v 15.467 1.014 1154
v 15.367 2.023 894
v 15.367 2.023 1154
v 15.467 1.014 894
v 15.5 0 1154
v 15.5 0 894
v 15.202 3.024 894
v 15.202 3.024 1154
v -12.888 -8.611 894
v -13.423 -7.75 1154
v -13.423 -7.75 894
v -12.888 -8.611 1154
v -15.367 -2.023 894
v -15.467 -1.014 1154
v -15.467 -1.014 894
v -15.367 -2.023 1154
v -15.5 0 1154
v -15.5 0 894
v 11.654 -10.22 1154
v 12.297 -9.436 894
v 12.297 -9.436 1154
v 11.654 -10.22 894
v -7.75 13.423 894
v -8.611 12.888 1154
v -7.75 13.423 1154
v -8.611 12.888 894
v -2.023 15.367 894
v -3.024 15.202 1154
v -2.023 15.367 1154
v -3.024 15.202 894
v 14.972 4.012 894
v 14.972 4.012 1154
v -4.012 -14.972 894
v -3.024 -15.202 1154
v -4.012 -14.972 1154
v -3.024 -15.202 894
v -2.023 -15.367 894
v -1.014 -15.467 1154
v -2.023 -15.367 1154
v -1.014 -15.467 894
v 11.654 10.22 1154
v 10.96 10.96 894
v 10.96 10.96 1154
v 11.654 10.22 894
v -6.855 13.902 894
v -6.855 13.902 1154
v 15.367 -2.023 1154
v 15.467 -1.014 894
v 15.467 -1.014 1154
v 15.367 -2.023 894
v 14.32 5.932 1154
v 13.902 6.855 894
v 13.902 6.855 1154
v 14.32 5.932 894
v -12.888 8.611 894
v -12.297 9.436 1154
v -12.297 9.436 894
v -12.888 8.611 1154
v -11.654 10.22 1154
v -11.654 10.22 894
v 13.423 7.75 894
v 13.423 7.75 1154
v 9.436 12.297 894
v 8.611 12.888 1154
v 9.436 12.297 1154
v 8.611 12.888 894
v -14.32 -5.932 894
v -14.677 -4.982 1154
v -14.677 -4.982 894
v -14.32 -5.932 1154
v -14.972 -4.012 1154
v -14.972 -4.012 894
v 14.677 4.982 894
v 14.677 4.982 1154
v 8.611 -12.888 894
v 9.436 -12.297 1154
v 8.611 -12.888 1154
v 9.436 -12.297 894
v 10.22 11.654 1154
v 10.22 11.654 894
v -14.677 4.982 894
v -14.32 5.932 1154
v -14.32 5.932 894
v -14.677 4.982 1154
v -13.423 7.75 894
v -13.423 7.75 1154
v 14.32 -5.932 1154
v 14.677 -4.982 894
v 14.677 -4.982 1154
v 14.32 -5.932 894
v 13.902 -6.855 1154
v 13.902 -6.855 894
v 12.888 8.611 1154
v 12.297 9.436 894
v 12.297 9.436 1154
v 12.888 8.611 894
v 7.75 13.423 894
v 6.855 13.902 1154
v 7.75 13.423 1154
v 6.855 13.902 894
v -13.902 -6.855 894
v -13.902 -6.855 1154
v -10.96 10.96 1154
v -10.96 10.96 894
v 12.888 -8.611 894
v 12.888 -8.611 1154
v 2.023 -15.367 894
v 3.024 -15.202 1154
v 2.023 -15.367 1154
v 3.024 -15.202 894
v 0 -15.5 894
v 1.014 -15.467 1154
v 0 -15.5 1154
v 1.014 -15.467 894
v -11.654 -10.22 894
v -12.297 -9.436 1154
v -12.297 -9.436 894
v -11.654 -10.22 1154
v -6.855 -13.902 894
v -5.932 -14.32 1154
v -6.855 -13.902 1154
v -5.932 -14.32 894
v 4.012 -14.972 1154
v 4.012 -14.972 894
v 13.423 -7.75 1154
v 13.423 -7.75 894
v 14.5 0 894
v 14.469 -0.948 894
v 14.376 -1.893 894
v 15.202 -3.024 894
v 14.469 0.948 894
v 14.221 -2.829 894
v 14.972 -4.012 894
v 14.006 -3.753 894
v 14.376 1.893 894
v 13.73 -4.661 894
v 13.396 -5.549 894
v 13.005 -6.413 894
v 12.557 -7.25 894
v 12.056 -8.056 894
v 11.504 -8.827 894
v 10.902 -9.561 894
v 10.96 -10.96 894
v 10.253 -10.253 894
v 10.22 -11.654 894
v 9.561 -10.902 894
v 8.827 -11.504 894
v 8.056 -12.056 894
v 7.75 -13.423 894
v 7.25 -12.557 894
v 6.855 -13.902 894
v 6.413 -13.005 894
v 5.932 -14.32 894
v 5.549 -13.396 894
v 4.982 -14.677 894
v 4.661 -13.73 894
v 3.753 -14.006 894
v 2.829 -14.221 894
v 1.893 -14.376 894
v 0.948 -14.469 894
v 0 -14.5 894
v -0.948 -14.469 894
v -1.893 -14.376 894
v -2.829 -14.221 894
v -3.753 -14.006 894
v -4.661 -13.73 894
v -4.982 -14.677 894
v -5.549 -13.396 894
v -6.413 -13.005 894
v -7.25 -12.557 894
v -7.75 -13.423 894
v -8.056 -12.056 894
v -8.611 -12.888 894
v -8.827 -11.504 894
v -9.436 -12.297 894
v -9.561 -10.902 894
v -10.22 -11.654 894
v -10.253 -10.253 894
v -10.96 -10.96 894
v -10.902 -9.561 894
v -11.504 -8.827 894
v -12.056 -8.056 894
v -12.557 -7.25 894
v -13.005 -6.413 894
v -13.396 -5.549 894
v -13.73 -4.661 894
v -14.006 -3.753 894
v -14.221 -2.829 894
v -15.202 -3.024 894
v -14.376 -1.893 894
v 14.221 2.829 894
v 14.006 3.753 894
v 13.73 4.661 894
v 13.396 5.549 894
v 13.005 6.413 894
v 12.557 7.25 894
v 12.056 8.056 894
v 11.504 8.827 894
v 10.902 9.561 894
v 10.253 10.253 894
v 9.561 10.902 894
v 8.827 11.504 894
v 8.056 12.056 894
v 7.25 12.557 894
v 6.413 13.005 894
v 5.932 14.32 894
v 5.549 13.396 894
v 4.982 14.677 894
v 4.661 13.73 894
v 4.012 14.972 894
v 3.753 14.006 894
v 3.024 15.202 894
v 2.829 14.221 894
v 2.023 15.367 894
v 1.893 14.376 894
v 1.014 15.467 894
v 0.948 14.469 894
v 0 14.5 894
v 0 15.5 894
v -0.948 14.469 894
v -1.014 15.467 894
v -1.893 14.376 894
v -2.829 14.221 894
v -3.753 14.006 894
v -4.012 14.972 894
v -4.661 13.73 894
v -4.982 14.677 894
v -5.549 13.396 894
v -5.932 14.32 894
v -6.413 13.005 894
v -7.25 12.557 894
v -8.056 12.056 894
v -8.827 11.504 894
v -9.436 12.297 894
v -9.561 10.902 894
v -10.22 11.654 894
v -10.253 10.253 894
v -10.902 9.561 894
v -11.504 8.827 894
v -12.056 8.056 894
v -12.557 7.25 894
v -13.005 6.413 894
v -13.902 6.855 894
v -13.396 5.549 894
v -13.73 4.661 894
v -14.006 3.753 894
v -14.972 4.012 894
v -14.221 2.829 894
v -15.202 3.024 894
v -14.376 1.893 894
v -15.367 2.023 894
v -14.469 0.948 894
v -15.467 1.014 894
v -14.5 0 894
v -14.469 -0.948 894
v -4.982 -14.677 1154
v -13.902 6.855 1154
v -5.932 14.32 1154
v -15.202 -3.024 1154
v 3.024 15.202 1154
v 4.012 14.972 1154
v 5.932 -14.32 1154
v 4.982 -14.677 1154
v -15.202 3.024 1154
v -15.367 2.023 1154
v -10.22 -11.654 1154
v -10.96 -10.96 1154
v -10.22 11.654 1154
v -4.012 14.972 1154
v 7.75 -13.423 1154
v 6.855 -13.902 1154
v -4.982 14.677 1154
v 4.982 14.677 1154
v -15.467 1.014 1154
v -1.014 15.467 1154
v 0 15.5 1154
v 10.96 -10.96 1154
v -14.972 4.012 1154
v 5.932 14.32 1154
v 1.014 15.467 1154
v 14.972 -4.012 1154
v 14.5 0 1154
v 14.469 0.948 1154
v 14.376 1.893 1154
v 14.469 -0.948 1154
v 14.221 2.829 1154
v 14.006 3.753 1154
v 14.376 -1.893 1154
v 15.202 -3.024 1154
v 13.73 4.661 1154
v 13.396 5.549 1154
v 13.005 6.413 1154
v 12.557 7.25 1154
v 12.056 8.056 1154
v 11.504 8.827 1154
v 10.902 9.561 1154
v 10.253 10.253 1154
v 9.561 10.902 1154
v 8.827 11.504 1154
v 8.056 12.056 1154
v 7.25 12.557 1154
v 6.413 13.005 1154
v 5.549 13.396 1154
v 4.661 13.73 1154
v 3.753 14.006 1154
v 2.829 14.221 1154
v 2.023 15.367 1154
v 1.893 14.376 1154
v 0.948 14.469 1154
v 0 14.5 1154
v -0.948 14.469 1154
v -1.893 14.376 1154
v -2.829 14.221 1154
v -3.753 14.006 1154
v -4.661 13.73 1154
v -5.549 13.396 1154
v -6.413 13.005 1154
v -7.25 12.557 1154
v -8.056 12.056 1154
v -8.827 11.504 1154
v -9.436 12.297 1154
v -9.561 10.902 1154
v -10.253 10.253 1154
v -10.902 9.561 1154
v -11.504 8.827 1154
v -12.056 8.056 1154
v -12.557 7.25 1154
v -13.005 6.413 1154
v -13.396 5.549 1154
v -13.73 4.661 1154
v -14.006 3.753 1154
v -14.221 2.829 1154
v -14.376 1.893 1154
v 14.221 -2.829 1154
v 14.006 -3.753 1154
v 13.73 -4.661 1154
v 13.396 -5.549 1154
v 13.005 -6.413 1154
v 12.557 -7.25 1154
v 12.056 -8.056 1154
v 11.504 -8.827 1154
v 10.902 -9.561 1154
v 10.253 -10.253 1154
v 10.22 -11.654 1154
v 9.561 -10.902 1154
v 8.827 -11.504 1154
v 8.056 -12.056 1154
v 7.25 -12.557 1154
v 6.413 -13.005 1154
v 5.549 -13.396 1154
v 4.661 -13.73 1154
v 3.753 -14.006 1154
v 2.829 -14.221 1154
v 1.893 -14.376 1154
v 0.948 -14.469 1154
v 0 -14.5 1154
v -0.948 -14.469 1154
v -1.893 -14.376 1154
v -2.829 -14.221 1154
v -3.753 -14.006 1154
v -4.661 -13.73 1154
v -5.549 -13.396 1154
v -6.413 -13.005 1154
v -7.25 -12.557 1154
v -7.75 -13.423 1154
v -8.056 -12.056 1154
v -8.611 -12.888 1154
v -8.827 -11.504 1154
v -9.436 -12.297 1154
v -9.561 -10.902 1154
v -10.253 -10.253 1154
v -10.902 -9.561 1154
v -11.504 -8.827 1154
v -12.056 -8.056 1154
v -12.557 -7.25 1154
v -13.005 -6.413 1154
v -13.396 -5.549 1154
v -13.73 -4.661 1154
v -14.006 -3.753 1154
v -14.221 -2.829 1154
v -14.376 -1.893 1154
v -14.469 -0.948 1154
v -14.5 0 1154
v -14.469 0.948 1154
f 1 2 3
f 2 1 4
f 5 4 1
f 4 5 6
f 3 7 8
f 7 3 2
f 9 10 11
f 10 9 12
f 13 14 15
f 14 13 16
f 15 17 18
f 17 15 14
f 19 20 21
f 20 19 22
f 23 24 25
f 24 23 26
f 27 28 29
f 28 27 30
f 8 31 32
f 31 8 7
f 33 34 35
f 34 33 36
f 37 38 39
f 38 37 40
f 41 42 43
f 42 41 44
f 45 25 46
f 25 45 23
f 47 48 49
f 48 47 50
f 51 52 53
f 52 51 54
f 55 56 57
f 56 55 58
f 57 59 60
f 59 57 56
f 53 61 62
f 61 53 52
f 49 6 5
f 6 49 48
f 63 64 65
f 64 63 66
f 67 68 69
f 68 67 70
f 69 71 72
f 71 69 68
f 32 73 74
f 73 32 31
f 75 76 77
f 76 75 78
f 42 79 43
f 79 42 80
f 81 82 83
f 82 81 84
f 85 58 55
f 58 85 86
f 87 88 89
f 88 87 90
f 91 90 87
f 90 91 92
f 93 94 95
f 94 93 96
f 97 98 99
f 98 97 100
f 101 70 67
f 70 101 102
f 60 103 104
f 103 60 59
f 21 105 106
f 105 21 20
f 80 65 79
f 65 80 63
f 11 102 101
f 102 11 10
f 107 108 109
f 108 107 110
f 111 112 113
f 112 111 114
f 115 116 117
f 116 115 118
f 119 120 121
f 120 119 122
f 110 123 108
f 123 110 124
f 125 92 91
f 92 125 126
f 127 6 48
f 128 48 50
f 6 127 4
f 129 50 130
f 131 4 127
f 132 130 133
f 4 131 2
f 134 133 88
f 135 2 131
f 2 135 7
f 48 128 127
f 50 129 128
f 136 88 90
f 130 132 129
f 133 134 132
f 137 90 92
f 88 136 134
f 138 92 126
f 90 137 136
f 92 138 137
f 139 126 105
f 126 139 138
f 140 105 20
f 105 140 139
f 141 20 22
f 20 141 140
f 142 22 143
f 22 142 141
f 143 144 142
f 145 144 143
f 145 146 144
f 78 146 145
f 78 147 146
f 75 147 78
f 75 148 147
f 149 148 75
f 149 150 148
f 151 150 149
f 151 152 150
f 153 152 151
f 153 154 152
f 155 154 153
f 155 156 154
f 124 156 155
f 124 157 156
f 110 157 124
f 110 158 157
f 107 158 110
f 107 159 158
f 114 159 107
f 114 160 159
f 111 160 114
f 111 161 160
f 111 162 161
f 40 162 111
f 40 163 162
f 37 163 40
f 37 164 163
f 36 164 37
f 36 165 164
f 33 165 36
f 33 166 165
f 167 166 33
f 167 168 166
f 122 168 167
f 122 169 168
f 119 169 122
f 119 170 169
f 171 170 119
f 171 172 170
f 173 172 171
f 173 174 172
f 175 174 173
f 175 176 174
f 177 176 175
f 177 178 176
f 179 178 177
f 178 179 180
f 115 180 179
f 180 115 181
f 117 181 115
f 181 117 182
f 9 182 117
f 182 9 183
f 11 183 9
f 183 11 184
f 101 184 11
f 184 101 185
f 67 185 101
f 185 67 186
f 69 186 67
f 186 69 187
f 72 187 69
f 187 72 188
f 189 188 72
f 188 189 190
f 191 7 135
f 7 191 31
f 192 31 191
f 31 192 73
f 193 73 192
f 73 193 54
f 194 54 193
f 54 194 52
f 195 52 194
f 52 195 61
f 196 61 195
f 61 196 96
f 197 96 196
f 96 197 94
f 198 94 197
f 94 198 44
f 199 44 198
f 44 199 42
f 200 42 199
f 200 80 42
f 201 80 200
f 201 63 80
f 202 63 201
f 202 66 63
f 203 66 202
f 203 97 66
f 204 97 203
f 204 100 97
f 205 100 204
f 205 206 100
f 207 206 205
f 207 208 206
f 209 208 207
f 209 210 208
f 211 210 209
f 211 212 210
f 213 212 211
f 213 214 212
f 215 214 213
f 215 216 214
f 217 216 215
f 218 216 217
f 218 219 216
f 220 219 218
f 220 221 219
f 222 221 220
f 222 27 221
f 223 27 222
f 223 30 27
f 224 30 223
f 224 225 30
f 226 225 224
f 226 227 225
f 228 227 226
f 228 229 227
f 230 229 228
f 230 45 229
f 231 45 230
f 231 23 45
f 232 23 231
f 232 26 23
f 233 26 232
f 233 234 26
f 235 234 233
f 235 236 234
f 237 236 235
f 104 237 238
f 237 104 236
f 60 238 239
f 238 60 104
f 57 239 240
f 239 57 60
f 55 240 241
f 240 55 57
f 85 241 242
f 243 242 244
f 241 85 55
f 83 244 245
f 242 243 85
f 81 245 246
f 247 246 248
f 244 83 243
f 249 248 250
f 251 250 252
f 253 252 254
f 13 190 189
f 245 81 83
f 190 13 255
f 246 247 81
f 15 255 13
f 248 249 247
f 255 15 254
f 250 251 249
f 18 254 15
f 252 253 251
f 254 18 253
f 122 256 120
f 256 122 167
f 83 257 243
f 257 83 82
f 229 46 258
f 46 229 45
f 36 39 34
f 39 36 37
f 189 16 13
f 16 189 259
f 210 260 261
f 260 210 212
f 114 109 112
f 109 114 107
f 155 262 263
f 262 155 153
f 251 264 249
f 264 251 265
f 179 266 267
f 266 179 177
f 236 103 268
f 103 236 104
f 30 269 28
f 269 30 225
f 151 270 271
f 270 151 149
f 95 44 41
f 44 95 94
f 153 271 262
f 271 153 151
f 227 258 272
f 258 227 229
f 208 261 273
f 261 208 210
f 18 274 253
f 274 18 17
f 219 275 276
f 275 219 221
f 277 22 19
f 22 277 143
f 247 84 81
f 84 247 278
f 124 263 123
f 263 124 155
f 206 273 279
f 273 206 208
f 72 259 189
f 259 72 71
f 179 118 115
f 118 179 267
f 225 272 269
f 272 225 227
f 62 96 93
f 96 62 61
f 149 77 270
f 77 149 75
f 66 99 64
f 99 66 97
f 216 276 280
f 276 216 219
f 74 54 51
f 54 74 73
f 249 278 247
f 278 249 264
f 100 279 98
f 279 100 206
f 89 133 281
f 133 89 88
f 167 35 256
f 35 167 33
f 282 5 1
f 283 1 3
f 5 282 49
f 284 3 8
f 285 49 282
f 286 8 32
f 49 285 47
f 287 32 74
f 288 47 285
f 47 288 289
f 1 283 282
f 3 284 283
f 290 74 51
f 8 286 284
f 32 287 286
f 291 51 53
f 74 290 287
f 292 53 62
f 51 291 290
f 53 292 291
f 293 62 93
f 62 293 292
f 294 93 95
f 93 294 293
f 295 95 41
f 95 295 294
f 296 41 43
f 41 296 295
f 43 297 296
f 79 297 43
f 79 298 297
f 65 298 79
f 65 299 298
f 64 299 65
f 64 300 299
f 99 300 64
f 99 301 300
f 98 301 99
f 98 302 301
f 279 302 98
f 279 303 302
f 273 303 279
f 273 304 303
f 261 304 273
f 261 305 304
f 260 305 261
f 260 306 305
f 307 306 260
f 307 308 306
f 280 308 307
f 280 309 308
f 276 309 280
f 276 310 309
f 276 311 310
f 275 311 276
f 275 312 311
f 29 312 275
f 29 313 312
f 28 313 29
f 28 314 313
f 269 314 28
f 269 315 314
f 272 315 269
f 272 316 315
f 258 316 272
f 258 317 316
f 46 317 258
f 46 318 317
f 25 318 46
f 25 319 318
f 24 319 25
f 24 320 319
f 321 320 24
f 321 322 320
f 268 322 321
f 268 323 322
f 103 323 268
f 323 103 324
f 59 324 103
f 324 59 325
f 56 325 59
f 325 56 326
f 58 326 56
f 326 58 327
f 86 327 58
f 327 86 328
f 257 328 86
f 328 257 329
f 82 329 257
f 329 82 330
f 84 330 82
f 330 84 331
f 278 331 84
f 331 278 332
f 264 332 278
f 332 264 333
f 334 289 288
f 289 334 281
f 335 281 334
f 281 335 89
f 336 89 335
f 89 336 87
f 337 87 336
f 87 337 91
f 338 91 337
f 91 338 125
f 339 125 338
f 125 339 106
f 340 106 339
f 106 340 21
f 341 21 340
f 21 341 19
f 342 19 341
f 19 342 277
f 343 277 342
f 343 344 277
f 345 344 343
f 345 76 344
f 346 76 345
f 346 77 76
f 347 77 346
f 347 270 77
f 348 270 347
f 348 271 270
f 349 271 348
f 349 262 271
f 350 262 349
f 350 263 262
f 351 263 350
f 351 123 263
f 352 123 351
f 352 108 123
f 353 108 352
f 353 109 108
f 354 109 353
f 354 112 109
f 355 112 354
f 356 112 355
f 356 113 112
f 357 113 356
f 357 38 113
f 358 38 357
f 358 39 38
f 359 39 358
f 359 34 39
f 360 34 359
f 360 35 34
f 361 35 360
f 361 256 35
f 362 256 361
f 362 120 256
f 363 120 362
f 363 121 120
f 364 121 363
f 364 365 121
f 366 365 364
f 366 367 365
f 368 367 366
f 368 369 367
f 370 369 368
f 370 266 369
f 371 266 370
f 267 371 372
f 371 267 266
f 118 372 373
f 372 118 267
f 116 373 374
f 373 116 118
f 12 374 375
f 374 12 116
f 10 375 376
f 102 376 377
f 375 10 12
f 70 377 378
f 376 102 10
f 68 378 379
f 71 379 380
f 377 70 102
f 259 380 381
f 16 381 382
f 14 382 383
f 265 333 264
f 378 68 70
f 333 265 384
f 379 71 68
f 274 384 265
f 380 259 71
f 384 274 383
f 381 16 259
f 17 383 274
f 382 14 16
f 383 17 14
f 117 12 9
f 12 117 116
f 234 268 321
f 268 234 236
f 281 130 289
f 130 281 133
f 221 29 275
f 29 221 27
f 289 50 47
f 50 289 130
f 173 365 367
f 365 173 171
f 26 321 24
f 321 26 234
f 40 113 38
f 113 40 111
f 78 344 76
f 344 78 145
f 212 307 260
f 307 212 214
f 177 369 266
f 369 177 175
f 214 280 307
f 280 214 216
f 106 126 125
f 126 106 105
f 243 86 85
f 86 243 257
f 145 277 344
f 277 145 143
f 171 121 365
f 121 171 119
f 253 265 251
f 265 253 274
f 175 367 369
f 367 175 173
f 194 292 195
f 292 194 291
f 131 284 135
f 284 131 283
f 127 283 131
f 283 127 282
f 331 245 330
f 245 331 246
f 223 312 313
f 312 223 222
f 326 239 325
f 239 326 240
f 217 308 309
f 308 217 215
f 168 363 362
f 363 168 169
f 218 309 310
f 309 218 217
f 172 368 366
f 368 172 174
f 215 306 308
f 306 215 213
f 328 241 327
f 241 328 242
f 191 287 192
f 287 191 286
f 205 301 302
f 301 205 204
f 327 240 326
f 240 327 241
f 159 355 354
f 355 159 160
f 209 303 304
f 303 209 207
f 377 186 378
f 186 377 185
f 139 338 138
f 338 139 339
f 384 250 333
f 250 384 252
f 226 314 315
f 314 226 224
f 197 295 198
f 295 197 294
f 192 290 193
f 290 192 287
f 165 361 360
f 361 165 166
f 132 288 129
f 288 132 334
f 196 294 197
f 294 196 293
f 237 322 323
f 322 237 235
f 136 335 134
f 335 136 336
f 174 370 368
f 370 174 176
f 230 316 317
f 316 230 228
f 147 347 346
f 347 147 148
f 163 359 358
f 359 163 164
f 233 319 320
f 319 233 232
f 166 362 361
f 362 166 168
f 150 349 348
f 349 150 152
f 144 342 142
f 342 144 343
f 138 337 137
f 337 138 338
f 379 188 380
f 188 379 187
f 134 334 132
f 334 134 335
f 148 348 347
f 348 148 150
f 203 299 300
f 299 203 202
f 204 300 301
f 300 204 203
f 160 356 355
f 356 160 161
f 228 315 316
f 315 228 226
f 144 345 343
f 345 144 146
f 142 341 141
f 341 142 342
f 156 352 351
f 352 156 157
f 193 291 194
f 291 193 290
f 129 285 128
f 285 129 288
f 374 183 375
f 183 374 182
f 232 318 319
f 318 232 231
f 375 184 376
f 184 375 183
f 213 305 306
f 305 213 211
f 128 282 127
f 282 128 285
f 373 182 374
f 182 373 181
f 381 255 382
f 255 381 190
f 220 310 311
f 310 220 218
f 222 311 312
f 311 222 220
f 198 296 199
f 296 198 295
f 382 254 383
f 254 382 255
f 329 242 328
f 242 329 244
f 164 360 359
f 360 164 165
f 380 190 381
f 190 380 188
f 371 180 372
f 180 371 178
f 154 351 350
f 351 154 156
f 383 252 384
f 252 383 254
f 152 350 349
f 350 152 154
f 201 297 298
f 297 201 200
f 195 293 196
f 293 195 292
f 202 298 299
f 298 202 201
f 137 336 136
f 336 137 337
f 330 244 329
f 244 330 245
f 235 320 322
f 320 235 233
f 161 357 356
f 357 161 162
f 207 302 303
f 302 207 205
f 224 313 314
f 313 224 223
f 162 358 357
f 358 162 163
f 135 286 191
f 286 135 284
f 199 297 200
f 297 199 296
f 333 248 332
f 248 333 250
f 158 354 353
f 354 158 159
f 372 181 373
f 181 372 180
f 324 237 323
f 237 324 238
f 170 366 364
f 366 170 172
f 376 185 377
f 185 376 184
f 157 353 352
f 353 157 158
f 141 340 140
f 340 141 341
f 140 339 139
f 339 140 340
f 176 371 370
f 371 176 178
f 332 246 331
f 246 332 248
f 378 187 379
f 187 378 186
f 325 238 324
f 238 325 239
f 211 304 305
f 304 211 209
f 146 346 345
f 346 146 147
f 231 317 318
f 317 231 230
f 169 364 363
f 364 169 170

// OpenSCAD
// file: ../lib/astra66_core.scad
// =============================================================================
// ASTRA-66 CAD rev B -- core library
// Parameters (generated from analysis.py by build.py), derived stations and helpers.
// Every part file includes this; stations mirror analysis.py X[] exactly.
//
// Frame: rocket axis = +Z, STA 0 = nose tip, stations increase aft.
// Angles: measured about +Z from +X toward +Y.  90 deg = switch / hatch side,
// 270 deg = camera side, 45 deg = rail-button line, fins at 0/90/180/270 deg.
// =============================================================================
include <../astra66_params.scad>

$fn = FN;
EPS = 0.01;
CAD_REV = "B";

// ----------------------------------------------------------------- radii
R_OD    = BODY_OD / 2;                 // body tube outer
R_ID    = BODY_ID / 2;                 // body tube inner
R_SH    = (BODY_ID - FIT_SH) / 2;      // printed shoulder / ring OD radius
R_SI    = R_SH - NC_SH_WALL;           // nose shoulder inner radius
R_CO    = CPL_OD / 2;                  // coupler outer
R_CI    = CPL_ID / 2;                  // coupler inner
R_BH_IN = (CPL_ID - 0.2) / 2;          // inner bulkhead disc (fits in coupler)
R_MO    = MMT_OD / 2;
R_MI    = MMT_ID / 2;
R_RING_BORE = (MMT_OD + FIT_SH) / 2;   // centering-ring / core bore
R_TAB_FLOOR = max(R_MO, RET_CLEAR_D / 2);          // rev B: tab clears the COTS retainer
FIN_TAB_H   = R_OD - R_TAB_FLOOR - FIN_TAB_CLR;

// ----------------------------------------------------------------- stations
X_NC_BASE     = NC_L;
X_SH_END      = NC_L + NC_SH_L;
X_PL_END      = NC_L + PL_L;
X_BAND_END    = X_PL_END + AV_BAND_L;
X_END         = X_BAND_END + BO_L;
L_OVERALL     = X_END;                              // airframe length (excl. COTS retainer)
X_CPL_FWD     = X_PL_END - AV_INS;
X_CPL_AFT     = X_BAND_END + AV_INS;
X_AVB_FWD_OUT = X_CPL_FWD - AV_BH_T;                // AV-303 forward face
X_AVB_AFT_OUT = X_CPL_AFT + GASKET_T;               // AV-304 outer-disc forward face
X_AVB_AFT_END = X_AVB_AFT_OUT + AV_BH_T;            // AV-304 aft face (recovery bay starts)
X_SLED_FWD    = X_CPL_FWD + AV_BH_T + SLED_FWD_GAP;
X_SLED_AFT    = X_SLED_FWD + SLED_L;
X_MMT_AFT     = X_END + MMT_AFT_EXT;
X_MMT_FWD     = X_MMT_AFT - MMT_L;
X_FIN_LE      = X_END - FIN_CR;
X_TAB_FWD     = X_FIN_LE + FIN_TAB_FWD;
X_TAB_AFT     = X_END - LOCK_T;
X_CORE_FWD    = X_TAB_FWD - CORE_RING_T;
X_CORE_AFT    = X_END - LOCK_T;
X_NC_SCREW    = NC_L + NC_SH_L / 2;
X_CAM         = X_SH_END + CAM_OFF;
X_HATCH       = X_SH_END + HATCH_OFF;
X_RB_FWD      = X_MMT_FWD - RB_FWD_OFF;
X_RB_AFT      = X_END - RB_AFT_OFF;
X_TRAY_FWD    = X_AVB_FWD_OUT - TRAY_L;
X_SW          = X_PL_END + AV_BAND_L / 2;
X_MOTOR_FWD   = X_MMT_AFT - MOTOR_L;
X_BAT0        = X_SLED_FWD + 2;
BAT_CAGE_L    = 12 + BAT_L + 0.6;
PAYLOAD_BAY_L  = X_AVB_FWD_OUT - X_SH_END;
RECOVERY_BAY_L = X_MMT_FWD - X_AVB_AFT_END;

FIN_ANGLES      = [for (i = [0 : FIN_N - 1]) i * 360 / FIN_N];
LOCK_SCREW_ANG  = [45, 135, 225, 315];
STATIC_PORT_ANG = [45, 135, 225, 315];

// ----------------------------------------------------------------- geometry helpers
function ogive_rho()  = (R_OD * R_OD + NC_L * NC_L) / (2 * R_OD);
function ogive_r(x)   = sqrt(max(pow(ogive_rho(), 2) - pow(NC_L - x, 2), 0)) + R_OD - ogive_rho();

// Solid of revolution of the tangent ogive between stations x0..x1, radially offset inward by off.
module ogive_solid(x0, x1, off = 0, n = 72) {
    s = (x0 == 0) ? 1 : 0;
    rotate_extrude()
        polygon(concat([[0, x0]],
                       [for (i = [s : n]) let(x = x0 + (x1 - x0) * i / n) [max(ogive_r(x) - off, 0.01), x]],
                       [[0, x1]]));
}

module tube_r(ro, ri, z0, z1) {
    translate([0, 0, z0]) difference() {
        cylinder(r = ro, h = z1 - z0);
        translate([0, 0, -1]) cylinder(r = ri, h = z1 - z0 + 2);
    }
}

module at_angle(a) { rotate([0, 0, a]) children(); }

// Cylinder of diameter d along the radial direction at angle a, from radius r0 to r1, at station z.
module radial_cyl(d, z, a, r0, r1) {
    at_angle(a) translate([r0, 0, z]) rotate([0, 90, 0]) cylinder(d = d, h = r1 - r0);
}

module rounded_rect(l, w, r) { offset(r = r) square([l - 2 * r, w - 2 * r], center = true); }

// Radial prism with a rounded-rectangle footprint (l axial x w tangential) centred at station z.
module radial_prism(a, z, l, w, rr, r0, r1) {
    at_angle(a) translate([r0, 0, z]) rotate([0, 90, 0]) linear_extrude(r1 - r0) rounded_rect(l, w, rr);
}

// Block in the radial frame at angle a: radial r0..r1, tangential +/-hw, stations z0..z1, clipped to radius rc.
module radial_block(a, r0, r1, hw, z0, z1, rc) {
    intersection() {
        at_angle(a) translate([r0, -hw, z0]) cube([r1 - r0, 2 * hw, z1 - z0]);
        translate([0, 0, z0 - 1]) cylinder(r = rc, h = z1 - z0 + 2);
    }
}

// Camera frame: child +Z = lens axis (outward, tilted CAM_TILT aft), origin at the lens face centre.
// Lens-face radius CAM_R0 is the smaller of (a) the tilted barrel rim 0.5 mm inside the bore and
// (b) the tilted camera-body corners 0.5 mm inside the bore -- so any CAM_W/CAM_LEN entered fits.
CAM_SETBACK = CAM_LENS_L * cos(CAM_TILT) + (CAM_LENS_HOLE - 1) / 2 * sin(CAM_TILT) + 0.5;
CAM_R0 = min(R_ID - CAM_SETBACK, sqrt(pow(R_ID - 0.5, 2) - pow(CAM_W / 2, 2)) - CAM_LEN / 2 * sin(CAM_TILT));
module cam_frame() {
    at_angle(CAM_ANG) translate([CAM_R0, 0, X_CAM]) rotate([0, 90 - CAM_TILT, 0]) children();
}

echo(str("ASTRA-66 CAD rev ", CAD_REV, ": L_OVERALL=", L_OVERALL, " payload bay=", PAYLOAD_BAY_L,
         " recovery bay=", RECOVERY_BAY_L, " fin tab depth=", FIN_TAB_H));
// main file
// ASTRA-66 CAD rev B -- BO-402 Motor mount tube (external propulsion interface I-05)
// MMT_ID, MMT_L and MMT_AFT_EXT are COMMERCIAL SPEC placeholders: take final values from the certified
// motor system's and retainer's current documentation. Nothing here specifies a motor.
include <../lib/astra66_core.scad>

module BO_402_motor_mount_tube() { tube_r(R_MO, R_MI, X_MMT_FWD, X_MMT_AFT); }

BO_402_motor_mount_tube();
